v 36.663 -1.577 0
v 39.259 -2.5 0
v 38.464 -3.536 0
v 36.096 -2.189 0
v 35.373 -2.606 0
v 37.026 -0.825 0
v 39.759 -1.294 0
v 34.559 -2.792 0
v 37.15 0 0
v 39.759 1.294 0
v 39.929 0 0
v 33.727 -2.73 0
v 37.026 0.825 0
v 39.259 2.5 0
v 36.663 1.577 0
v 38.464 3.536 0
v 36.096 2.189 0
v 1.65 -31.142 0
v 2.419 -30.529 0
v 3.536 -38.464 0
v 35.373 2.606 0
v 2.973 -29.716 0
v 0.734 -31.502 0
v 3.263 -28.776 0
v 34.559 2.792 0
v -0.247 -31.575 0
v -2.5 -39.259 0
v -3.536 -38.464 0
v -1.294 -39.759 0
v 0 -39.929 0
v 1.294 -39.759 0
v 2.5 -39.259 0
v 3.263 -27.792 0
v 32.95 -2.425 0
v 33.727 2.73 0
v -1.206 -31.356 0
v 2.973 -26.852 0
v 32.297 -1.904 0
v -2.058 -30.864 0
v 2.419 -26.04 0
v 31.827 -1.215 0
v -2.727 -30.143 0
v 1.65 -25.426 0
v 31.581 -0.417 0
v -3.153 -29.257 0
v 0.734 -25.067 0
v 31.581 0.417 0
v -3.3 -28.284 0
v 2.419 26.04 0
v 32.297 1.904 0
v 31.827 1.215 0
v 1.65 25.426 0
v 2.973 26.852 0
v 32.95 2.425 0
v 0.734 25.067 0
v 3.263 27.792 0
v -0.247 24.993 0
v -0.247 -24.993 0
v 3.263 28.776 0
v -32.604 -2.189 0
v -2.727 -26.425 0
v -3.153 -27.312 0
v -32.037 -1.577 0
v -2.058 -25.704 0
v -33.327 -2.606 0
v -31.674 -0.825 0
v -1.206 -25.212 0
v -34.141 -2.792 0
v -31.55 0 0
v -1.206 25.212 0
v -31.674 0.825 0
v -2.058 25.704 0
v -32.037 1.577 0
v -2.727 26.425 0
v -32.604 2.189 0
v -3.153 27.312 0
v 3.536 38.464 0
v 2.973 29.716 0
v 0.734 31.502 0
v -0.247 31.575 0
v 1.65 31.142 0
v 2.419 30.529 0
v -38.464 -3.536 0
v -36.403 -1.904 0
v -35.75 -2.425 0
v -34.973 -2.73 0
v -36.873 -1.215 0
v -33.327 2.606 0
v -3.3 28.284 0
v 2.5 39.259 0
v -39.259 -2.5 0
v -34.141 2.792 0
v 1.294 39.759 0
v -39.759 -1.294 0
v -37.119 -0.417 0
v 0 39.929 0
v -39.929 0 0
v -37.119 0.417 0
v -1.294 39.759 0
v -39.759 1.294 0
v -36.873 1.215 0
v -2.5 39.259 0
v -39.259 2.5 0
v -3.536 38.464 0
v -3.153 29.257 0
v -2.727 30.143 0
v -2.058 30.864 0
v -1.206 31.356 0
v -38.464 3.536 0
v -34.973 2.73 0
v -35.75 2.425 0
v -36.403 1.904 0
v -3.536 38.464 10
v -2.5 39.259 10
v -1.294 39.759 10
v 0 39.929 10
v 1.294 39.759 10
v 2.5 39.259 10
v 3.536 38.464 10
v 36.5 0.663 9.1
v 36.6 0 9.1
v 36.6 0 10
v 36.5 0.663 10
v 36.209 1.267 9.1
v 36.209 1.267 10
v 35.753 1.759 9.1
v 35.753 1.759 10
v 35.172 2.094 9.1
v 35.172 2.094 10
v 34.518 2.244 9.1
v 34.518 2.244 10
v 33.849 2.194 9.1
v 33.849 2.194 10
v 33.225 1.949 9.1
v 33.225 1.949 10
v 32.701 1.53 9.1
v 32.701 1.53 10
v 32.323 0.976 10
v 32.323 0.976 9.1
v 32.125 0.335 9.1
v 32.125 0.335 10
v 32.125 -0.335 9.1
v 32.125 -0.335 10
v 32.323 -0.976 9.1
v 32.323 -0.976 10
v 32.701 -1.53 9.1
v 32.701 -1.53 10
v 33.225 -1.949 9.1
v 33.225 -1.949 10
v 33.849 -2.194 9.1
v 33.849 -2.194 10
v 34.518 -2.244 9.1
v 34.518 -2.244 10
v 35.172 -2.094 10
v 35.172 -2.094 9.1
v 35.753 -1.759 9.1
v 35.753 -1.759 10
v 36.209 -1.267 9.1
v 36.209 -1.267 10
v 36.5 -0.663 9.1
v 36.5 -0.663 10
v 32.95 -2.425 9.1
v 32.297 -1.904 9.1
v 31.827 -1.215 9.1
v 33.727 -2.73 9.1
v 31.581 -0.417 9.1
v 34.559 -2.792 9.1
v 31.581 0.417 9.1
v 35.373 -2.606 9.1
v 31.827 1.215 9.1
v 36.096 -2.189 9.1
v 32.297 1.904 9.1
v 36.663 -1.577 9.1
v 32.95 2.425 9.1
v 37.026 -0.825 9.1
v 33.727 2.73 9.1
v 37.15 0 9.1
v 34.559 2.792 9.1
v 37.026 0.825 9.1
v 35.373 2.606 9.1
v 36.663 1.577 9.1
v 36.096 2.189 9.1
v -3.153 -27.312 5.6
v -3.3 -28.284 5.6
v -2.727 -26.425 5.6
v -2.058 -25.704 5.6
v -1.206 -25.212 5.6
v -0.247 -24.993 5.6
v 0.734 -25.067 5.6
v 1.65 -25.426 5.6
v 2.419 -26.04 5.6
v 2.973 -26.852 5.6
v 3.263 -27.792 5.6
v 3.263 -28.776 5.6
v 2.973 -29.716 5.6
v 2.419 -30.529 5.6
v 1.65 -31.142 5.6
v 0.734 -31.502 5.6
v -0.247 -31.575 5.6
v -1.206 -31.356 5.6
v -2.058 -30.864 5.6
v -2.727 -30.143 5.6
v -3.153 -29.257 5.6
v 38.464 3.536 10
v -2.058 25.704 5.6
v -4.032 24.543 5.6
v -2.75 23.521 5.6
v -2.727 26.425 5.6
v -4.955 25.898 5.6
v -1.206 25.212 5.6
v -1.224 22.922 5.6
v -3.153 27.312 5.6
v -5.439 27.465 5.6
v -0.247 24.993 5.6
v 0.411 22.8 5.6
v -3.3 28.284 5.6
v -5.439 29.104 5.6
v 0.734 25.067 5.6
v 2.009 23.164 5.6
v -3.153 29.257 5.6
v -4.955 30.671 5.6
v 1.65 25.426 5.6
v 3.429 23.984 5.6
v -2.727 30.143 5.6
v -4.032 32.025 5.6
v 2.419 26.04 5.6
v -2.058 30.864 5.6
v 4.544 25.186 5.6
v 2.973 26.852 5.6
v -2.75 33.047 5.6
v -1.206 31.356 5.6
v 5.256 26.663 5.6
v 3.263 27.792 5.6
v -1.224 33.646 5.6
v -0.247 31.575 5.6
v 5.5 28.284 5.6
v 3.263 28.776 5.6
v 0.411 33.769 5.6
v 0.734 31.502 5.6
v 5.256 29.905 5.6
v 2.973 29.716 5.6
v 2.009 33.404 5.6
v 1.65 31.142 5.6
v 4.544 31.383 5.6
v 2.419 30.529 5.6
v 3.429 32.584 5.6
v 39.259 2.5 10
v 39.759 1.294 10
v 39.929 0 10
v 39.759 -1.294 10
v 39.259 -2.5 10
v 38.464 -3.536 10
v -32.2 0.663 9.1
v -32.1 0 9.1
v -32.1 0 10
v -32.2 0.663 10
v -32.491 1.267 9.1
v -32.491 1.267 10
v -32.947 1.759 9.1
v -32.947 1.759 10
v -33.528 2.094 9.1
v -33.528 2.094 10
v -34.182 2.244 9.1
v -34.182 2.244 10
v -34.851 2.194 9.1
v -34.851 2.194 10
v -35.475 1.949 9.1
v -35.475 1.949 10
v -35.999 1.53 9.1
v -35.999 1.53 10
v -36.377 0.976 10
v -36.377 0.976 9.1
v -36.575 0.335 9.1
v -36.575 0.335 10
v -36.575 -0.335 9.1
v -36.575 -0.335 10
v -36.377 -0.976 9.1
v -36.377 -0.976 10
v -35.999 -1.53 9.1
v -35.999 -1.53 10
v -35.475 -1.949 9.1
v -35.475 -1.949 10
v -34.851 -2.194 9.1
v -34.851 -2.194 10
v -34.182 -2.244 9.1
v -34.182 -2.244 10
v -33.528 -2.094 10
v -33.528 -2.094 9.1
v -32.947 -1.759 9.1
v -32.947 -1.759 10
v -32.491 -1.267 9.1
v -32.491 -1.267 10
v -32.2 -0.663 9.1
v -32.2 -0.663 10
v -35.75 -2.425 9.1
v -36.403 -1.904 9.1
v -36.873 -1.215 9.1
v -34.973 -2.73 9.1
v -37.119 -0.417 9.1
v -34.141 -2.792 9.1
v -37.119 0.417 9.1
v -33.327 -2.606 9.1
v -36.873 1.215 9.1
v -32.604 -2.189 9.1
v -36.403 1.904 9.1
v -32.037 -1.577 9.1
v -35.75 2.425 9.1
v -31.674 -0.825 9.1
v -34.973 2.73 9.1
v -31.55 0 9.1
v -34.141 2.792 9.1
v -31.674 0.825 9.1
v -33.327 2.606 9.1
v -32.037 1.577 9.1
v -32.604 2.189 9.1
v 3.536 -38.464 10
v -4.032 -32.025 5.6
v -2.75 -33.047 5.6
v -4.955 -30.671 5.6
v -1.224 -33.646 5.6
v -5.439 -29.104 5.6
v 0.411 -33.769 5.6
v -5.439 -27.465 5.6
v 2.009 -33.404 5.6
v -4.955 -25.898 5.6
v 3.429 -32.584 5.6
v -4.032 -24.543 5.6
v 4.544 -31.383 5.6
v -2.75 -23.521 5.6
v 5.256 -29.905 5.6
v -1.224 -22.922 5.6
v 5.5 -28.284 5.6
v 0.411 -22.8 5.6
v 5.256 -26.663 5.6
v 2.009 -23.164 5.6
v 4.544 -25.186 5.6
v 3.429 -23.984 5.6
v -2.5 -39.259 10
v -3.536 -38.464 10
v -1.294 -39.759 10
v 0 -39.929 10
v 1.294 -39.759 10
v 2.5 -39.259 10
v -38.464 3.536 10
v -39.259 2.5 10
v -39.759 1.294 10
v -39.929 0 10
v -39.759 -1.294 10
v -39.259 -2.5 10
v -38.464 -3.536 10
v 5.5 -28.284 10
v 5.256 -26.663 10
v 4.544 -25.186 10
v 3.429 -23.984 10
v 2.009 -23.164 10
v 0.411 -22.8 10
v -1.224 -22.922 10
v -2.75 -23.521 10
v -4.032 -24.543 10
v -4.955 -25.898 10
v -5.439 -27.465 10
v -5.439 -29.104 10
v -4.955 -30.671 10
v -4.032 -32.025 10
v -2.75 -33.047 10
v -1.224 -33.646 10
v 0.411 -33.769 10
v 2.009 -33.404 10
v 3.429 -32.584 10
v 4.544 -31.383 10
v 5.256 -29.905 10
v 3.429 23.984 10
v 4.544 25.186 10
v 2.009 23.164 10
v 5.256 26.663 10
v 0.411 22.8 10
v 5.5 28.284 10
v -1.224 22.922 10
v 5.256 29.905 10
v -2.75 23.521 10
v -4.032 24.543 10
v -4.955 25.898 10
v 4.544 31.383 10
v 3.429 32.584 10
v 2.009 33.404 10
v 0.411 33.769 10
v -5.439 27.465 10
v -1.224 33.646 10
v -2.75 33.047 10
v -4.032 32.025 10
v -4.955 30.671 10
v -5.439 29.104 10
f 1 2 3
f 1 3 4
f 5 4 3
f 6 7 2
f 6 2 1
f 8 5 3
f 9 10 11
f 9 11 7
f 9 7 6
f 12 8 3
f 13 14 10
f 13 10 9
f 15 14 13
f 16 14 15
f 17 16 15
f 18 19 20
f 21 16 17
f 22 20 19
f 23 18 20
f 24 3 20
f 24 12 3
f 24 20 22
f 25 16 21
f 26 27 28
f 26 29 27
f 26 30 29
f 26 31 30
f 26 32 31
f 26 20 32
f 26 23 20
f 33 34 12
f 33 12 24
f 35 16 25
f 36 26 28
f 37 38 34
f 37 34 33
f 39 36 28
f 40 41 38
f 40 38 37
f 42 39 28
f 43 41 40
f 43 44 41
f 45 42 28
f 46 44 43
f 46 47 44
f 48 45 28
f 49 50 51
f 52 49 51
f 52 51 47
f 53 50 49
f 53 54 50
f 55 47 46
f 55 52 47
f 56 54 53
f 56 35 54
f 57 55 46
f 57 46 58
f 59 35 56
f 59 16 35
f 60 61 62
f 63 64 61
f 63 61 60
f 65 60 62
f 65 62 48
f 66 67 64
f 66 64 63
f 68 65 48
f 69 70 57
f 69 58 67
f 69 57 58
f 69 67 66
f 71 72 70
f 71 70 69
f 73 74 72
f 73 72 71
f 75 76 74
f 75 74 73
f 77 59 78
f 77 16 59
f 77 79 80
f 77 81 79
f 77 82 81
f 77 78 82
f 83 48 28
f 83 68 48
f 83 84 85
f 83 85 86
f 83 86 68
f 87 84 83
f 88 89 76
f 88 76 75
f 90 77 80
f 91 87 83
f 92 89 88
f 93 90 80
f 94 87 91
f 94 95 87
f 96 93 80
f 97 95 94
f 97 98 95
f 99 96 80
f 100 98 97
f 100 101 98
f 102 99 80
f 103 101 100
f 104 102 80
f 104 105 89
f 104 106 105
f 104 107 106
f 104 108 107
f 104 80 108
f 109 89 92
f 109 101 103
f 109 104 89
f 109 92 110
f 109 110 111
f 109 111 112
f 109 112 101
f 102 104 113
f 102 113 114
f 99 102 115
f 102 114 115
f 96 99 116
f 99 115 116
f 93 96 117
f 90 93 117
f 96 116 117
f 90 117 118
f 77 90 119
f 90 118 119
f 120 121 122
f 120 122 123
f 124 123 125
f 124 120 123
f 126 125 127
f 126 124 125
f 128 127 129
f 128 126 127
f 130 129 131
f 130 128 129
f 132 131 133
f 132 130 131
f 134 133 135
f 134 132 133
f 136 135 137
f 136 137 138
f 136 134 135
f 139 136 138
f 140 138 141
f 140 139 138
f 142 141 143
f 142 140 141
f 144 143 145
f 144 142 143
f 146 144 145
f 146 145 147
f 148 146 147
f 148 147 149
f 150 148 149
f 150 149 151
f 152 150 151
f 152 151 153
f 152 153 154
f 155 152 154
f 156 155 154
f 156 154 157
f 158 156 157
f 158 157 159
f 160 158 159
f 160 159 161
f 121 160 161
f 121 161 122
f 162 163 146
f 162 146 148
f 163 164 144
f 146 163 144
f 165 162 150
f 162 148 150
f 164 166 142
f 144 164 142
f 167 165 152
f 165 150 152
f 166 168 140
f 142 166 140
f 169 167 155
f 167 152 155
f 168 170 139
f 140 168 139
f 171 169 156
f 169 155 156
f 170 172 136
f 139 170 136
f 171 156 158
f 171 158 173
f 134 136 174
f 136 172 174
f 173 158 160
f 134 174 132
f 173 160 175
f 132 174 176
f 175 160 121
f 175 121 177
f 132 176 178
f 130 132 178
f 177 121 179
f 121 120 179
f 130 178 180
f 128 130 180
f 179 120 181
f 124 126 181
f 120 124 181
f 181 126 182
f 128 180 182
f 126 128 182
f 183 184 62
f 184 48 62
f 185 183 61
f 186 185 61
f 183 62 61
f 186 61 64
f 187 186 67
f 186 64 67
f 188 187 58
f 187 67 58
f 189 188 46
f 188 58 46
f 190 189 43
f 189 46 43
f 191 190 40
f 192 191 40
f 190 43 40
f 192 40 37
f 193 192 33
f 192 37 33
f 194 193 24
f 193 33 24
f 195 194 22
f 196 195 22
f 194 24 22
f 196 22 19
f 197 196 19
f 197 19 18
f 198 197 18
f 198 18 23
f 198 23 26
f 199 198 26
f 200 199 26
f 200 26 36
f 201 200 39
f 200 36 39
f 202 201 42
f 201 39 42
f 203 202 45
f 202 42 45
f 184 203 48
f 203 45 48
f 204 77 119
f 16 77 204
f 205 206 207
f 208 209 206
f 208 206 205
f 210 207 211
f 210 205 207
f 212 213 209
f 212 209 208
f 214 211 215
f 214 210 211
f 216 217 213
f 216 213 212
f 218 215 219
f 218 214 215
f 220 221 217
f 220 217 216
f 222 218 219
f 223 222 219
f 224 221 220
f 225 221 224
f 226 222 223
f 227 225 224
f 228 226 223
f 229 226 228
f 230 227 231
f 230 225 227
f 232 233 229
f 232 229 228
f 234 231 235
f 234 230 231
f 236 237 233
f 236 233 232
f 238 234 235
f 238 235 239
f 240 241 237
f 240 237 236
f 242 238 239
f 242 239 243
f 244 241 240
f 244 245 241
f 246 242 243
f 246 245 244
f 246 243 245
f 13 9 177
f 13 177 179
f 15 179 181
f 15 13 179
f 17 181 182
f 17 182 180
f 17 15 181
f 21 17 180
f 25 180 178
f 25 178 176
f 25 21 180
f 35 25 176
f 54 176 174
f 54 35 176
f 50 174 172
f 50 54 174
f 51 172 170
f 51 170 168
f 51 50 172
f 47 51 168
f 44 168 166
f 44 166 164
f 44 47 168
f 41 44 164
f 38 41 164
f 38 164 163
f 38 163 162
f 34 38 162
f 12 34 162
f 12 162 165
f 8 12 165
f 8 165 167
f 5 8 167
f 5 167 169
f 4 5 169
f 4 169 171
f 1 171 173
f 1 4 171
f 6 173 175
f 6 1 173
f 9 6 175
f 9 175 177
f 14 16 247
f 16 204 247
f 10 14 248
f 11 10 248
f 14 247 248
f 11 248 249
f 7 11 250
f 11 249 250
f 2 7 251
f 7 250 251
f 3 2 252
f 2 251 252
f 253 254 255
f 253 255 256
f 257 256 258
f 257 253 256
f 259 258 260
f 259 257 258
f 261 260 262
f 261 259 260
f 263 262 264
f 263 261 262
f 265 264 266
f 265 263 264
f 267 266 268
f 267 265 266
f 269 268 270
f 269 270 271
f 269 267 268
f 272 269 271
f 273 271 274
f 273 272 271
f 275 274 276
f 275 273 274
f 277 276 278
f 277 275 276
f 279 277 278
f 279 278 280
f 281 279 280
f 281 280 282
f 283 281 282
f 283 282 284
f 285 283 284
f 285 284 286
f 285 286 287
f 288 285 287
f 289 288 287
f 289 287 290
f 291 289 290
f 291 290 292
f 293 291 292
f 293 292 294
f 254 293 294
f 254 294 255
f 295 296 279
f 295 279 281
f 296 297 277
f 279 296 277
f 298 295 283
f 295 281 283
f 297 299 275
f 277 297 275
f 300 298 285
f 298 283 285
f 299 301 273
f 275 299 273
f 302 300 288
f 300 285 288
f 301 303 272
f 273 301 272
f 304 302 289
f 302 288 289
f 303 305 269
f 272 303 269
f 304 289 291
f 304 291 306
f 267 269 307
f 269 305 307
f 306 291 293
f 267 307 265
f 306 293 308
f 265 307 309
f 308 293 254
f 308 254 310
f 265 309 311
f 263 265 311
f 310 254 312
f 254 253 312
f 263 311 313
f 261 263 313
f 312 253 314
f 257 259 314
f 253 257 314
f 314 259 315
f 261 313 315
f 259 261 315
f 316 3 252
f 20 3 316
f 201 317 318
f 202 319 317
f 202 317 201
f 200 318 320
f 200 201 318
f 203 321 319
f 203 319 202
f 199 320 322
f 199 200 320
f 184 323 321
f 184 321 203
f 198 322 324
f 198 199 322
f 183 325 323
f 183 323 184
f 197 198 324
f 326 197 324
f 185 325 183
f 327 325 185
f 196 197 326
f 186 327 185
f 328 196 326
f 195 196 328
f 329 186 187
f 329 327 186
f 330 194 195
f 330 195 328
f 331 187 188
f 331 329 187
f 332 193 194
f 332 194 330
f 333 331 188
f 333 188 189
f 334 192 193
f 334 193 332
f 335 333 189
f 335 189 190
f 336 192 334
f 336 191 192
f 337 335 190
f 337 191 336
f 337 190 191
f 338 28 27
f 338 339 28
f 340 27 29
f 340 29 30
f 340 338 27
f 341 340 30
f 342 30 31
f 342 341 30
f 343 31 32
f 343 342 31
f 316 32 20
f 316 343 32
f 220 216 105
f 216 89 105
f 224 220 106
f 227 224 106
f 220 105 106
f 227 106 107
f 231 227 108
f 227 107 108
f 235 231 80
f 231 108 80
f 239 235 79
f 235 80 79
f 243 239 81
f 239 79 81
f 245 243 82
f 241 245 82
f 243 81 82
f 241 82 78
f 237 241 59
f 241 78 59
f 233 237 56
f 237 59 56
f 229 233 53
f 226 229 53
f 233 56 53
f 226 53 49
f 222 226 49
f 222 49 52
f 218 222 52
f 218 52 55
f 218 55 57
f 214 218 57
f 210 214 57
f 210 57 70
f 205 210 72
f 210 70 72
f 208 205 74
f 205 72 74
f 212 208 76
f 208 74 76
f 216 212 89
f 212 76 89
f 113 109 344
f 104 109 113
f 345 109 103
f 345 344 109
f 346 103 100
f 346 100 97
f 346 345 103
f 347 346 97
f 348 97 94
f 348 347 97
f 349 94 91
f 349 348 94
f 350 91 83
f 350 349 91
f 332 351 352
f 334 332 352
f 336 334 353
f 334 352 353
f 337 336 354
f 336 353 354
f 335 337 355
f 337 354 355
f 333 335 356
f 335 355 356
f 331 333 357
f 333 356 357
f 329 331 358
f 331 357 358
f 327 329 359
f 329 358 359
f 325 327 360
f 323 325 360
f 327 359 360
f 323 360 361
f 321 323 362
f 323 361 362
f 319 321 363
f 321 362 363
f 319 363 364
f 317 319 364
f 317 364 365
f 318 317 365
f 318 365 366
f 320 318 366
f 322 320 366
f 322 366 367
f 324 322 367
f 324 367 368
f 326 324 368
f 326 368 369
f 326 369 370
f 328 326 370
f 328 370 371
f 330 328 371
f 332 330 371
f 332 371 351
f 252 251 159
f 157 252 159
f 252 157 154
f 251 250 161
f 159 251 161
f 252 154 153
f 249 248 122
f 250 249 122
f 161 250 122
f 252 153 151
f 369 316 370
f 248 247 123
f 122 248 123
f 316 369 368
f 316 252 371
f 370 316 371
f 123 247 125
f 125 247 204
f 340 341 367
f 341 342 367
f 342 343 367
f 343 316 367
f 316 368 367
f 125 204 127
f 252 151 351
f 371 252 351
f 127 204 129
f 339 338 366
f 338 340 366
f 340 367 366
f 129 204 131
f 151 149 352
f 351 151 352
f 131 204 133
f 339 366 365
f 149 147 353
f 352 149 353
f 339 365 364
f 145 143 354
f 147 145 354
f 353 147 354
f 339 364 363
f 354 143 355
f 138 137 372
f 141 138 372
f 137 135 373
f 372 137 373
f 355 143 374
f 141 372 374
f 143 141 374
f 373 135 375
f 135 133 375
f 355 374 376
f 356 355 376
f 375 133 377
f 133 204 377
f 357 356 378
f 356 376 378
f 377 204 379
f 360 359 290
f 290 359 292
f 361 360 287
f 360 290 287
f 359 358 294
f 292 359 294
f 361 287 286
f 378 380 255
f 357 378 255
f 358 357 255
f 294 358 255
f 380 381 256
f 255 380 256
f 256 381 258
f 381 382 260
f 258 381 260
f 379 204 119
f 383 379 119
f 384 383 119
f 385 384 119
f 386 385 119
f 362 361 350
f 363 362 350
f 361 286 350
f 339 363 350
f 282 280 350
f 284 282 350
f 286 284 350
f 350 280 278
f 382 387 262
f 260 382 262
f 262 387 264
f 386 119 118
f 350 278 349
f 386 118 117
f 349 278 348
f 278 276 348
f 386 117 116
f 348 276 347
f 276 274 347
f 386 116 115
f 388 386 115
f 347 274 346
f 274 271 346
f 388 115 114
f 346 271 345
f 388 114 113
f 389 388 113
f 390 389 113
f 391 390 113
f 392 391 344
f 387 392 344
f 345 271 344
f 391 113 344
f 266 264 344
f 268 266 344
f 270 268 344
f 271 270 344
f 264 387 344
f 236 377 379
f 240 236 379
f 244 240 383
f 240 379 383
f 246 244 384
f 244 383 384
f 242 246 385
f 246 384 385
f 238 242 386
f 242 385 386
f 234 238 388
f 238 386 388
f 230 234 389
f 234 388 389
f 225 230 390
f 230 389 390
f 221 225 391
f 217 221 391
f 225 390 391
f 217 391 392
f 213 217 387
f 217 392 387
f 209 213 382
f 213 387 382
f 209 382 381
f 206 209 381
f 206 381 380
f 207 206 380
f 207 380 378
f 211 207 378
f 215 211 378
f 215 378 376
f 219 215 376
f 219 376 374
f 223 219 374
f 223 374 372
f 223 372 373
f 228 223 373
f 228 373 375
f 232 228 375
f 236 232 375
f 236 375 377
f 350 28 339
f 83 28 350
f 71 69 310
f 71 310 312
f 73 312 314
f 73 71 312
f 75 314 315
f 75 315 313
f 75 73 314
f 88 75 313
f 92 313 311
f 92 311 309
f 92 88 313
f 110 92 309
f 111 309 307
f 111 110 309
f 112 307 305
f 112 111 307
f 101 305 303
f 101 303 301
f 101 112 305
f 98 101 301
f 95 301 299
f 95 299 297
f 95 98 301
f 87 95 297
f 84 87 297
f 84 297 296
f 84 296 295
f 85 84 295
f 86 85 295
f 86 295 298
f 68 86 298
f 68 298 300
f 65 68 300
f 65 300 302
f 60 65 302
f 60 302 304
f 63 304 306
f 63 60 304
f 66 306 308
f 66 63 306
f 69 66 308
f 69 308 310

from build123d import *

# Parameters (mm, degrees)
SKETCH1_R                                           = 2.25
BOSS_EXTRUDE1_DEPTH                                 = 10
SKETCH2_R                                           = 2.8
CUT_EXTRUDE1_DEPTH                                  = 9.1
CBORE_FOR_M6_HEX_SOCKET_HEAD_CAP_SCREW1_D           = 6.6
CBORE_FOR_M6_HEX_SOCKET_HEAD_CAP_SCREW1_CBORE_D     = 11
CBORE_FOR_M6_HEX_SOCKET_HEAD_CAP_SCREW1_CBORE_DEPTH = 4.4
CBORE_FOR_M6_HEX_SOCKET_HEAD_CAP_SCR_2_D            = 6.6
CBORE_FOR_M6_HEX_SOCKET_HEAD_CAP_SCR_2_CBORE_D      = 11
CBORE_FOR_M6_HEX_SOCKET_HEAD_CAP_SCR_2_CBORE_DEPTH  = 4.4
FILLET2_R                                           = 5


with BuildPart() as part:
    # Sketch1 → Boss-Extrude1 (new body)
    with BuildSketch(Plane.XY):
        Polygon((-42, 0), (0, 42), (42, 0), (0, -42), align=None)
        with Locations((-34.35, 0)):
            Circle(SKETCH1_R, mode=Mode.SUBTRACT)
        with Locations((34.35, 0)):
            Circle(SKETCH1_R, mode=Mode.SUBTRACT)
    extrude(amount=BOSS_EXTRUDE1_DEPTH)

    # Sketch2 → Cut-Extrude1 (cut)
    with BuildSketch(Plane.XY):
        with Locations((34.35, 0)):
            Circle(SKETCH2_R)
        with Locations((-34.35, 0)):
            Circle(SKETCH2_R)
    extrude(amount=CUT_EXTRUDE1_DEPTH, mode=Mode.SUBTRACT)

    # CBORE for M6 Hex Socket Head Cap Screw1 (through all)
    with Locations(Plane(origin=(0, 28.284271247, 10), x_dir=(1, 0, 0), z_dir=(0, 0, 1))):
        with Locations((0, 0), (0, -56.568542494)):
            CounterBoreHole(CBORE_FOR_M6_HEX_SOCKET_HEAD_CAP_SCREW1_D / 2, CBORE_FOR_M6_HEX_SOCKET_HEAD_CAP_SCREW1_CBORE_D / 2, CBORE_FOR_M6_HEX_SOCKET_HEAD_CAP_SCREW1_CBORE_DEPTH)

    # CBORE for M6 Hex Socket Head Cap Scr 2 (through all)
    with Locations(Plane(origin=(55.283571739, 20.980488531, 0), x_dir=(1, 0, 0), z_dir=(0, 0, 1))):
        with Locations((0, 0)):
            CounterBoreHole(CBORE_FOR_M6_HEX_SOCKET_HEAD_CAP_SCR_2_D / 2, CBORE_FOR_M6_HEX_SOCKET_HEAD_CAP_SCR_2_CBORE_D / 2, CBORE_FOR_M6_HEX_SOCKET_HEAD_CAP_SCR_2_CBORE_DEPTH)

    # Fillet2
    fillet2_edges = [part.edges().sort_by_distance(p)[0] for p in [
        (-42, 0, 5),
        (0, 42, 5),
        (42, 0, 5),
        (0, -42, 5),
    ]]
    fillet(fillet2_edges, radius=FILLET2_R)


solid = part.part
